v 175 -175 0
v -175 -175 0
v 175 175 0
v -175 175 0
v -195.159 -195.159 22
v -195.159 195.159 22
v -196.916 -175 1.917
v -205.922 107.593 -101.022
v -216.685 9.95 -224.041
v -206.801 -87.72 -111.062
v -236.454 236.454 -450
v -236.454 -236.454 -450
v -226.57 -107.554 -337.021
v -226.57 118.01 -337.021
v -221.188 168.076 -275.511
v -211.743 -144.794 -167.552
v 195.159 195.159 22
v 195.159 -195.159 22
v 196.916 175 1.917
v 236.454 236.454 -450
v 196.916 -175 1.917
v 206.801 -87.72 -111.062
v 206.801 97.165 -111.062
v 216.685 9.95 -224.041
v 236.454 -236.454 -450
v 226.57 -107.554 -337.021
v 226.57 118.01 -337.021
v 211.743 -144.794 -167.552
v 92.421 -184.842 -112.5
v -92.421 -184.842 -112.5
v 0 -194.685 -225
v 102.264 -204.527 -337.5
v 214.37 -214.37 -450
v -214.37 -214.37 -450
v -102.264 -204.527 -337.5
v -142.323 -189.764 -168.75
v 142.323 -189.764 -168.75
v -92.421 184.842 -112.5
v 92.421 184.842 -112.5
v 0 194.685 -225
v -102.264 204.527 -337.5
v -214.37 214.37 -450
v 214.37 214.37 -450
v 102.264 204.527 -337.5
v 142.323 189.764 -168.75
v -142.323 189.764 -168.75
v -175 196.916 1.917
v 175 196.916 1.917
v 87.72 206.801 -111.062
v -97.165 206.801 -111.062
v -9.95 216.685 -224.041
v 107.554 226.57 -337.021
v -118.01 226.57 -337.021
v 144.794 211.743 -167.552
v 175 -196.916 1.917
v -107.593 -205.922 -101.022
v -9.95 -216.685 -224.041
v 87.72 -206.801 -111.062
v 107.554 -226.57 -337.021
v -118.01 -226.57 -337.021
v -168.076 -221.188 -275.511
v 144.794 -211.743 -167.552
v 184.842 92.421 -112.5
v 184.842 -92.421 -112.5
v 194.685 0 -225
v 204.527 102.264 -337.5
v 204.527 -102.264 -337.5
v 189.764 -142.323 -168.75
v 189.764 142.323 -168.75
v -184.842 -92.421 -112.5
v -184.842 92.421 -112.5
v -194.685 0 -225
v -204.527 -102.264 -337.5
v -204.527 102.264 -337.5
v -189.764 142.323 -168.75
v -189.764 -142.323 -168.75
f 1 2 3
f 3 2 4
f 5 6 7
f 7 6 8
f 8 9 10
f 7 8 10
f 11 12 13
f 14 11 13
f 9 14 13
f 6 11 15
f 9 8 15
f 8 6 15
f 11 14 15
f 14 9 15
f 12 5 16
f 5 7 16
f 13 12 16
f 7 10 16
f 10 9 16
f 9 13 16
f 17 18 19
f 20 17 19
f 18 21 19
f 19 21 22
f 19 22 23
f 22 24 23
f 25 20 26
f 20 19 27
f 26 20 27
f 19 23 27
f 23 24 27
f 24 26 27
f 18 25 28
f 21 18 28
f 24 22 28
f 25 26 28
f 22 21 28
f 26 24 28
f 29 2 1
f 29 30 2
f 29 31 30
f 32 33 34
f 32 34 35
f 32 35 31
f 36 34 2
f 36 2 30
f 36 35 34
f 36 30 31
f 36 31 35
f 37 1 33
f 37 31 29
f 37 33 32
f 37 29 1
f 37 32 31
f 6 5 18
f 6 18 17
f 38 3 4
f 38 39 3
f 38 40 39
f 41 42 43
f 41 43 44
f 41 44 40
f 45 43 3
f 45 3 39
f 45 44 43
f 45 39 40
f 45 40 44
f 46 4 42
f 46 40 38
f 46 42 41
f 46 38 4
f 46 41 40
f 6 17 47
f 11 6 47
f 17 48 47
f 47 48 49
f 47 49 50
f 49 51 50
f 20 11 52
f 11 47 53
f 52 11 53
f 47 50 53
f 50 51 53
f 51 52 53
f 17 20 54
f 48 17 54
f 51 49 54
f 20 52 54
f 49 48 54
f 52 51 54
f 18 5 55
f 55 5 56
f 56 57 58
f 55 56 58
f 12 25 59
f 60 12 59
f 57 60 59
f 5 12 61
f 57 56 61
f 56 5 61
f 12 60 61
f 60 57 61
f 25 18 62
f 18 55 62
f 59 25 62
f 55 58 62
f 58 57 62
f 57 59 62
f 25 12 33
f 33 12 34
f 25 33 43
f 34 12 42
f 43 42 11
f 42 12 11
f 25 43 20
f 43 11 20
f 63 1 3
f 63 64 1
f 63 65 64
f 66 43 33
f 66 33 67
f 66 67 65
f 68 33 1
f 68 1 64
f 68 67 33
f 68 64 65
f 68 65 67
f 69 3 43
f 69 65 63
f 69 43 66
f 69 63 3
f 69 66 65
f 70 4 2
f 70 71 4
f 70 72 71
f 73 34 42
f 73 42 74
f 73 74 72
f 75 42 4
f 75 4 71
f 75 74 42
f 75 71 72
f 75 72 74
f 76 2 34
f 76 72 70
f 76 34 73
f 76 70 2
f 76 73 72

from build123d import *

# Parameters (mm, degrees)
F0_W     = 350
F0_H     = 350
F1_DEPTH = 450
F1_TAPER = -5
F2_T     = 22


with BuildPart() as f1:
    # F0 (on Top) → F1 (new body)
    with BuildSketch(Plane.XY):
        Rectangle(F0_W, F0_H)
    extrude(amount=-F1_DEPTH, taper=F1_TAPER)

    # F2
    f2_openings = [f1.faces().sort_by_distance(p)[0] for p in [
        (0, 0, -450),
    ]]
    offset(amount=F2_T, openings=f2_openings, kind=Kind.INTERSECTION)


solid = f1.part
